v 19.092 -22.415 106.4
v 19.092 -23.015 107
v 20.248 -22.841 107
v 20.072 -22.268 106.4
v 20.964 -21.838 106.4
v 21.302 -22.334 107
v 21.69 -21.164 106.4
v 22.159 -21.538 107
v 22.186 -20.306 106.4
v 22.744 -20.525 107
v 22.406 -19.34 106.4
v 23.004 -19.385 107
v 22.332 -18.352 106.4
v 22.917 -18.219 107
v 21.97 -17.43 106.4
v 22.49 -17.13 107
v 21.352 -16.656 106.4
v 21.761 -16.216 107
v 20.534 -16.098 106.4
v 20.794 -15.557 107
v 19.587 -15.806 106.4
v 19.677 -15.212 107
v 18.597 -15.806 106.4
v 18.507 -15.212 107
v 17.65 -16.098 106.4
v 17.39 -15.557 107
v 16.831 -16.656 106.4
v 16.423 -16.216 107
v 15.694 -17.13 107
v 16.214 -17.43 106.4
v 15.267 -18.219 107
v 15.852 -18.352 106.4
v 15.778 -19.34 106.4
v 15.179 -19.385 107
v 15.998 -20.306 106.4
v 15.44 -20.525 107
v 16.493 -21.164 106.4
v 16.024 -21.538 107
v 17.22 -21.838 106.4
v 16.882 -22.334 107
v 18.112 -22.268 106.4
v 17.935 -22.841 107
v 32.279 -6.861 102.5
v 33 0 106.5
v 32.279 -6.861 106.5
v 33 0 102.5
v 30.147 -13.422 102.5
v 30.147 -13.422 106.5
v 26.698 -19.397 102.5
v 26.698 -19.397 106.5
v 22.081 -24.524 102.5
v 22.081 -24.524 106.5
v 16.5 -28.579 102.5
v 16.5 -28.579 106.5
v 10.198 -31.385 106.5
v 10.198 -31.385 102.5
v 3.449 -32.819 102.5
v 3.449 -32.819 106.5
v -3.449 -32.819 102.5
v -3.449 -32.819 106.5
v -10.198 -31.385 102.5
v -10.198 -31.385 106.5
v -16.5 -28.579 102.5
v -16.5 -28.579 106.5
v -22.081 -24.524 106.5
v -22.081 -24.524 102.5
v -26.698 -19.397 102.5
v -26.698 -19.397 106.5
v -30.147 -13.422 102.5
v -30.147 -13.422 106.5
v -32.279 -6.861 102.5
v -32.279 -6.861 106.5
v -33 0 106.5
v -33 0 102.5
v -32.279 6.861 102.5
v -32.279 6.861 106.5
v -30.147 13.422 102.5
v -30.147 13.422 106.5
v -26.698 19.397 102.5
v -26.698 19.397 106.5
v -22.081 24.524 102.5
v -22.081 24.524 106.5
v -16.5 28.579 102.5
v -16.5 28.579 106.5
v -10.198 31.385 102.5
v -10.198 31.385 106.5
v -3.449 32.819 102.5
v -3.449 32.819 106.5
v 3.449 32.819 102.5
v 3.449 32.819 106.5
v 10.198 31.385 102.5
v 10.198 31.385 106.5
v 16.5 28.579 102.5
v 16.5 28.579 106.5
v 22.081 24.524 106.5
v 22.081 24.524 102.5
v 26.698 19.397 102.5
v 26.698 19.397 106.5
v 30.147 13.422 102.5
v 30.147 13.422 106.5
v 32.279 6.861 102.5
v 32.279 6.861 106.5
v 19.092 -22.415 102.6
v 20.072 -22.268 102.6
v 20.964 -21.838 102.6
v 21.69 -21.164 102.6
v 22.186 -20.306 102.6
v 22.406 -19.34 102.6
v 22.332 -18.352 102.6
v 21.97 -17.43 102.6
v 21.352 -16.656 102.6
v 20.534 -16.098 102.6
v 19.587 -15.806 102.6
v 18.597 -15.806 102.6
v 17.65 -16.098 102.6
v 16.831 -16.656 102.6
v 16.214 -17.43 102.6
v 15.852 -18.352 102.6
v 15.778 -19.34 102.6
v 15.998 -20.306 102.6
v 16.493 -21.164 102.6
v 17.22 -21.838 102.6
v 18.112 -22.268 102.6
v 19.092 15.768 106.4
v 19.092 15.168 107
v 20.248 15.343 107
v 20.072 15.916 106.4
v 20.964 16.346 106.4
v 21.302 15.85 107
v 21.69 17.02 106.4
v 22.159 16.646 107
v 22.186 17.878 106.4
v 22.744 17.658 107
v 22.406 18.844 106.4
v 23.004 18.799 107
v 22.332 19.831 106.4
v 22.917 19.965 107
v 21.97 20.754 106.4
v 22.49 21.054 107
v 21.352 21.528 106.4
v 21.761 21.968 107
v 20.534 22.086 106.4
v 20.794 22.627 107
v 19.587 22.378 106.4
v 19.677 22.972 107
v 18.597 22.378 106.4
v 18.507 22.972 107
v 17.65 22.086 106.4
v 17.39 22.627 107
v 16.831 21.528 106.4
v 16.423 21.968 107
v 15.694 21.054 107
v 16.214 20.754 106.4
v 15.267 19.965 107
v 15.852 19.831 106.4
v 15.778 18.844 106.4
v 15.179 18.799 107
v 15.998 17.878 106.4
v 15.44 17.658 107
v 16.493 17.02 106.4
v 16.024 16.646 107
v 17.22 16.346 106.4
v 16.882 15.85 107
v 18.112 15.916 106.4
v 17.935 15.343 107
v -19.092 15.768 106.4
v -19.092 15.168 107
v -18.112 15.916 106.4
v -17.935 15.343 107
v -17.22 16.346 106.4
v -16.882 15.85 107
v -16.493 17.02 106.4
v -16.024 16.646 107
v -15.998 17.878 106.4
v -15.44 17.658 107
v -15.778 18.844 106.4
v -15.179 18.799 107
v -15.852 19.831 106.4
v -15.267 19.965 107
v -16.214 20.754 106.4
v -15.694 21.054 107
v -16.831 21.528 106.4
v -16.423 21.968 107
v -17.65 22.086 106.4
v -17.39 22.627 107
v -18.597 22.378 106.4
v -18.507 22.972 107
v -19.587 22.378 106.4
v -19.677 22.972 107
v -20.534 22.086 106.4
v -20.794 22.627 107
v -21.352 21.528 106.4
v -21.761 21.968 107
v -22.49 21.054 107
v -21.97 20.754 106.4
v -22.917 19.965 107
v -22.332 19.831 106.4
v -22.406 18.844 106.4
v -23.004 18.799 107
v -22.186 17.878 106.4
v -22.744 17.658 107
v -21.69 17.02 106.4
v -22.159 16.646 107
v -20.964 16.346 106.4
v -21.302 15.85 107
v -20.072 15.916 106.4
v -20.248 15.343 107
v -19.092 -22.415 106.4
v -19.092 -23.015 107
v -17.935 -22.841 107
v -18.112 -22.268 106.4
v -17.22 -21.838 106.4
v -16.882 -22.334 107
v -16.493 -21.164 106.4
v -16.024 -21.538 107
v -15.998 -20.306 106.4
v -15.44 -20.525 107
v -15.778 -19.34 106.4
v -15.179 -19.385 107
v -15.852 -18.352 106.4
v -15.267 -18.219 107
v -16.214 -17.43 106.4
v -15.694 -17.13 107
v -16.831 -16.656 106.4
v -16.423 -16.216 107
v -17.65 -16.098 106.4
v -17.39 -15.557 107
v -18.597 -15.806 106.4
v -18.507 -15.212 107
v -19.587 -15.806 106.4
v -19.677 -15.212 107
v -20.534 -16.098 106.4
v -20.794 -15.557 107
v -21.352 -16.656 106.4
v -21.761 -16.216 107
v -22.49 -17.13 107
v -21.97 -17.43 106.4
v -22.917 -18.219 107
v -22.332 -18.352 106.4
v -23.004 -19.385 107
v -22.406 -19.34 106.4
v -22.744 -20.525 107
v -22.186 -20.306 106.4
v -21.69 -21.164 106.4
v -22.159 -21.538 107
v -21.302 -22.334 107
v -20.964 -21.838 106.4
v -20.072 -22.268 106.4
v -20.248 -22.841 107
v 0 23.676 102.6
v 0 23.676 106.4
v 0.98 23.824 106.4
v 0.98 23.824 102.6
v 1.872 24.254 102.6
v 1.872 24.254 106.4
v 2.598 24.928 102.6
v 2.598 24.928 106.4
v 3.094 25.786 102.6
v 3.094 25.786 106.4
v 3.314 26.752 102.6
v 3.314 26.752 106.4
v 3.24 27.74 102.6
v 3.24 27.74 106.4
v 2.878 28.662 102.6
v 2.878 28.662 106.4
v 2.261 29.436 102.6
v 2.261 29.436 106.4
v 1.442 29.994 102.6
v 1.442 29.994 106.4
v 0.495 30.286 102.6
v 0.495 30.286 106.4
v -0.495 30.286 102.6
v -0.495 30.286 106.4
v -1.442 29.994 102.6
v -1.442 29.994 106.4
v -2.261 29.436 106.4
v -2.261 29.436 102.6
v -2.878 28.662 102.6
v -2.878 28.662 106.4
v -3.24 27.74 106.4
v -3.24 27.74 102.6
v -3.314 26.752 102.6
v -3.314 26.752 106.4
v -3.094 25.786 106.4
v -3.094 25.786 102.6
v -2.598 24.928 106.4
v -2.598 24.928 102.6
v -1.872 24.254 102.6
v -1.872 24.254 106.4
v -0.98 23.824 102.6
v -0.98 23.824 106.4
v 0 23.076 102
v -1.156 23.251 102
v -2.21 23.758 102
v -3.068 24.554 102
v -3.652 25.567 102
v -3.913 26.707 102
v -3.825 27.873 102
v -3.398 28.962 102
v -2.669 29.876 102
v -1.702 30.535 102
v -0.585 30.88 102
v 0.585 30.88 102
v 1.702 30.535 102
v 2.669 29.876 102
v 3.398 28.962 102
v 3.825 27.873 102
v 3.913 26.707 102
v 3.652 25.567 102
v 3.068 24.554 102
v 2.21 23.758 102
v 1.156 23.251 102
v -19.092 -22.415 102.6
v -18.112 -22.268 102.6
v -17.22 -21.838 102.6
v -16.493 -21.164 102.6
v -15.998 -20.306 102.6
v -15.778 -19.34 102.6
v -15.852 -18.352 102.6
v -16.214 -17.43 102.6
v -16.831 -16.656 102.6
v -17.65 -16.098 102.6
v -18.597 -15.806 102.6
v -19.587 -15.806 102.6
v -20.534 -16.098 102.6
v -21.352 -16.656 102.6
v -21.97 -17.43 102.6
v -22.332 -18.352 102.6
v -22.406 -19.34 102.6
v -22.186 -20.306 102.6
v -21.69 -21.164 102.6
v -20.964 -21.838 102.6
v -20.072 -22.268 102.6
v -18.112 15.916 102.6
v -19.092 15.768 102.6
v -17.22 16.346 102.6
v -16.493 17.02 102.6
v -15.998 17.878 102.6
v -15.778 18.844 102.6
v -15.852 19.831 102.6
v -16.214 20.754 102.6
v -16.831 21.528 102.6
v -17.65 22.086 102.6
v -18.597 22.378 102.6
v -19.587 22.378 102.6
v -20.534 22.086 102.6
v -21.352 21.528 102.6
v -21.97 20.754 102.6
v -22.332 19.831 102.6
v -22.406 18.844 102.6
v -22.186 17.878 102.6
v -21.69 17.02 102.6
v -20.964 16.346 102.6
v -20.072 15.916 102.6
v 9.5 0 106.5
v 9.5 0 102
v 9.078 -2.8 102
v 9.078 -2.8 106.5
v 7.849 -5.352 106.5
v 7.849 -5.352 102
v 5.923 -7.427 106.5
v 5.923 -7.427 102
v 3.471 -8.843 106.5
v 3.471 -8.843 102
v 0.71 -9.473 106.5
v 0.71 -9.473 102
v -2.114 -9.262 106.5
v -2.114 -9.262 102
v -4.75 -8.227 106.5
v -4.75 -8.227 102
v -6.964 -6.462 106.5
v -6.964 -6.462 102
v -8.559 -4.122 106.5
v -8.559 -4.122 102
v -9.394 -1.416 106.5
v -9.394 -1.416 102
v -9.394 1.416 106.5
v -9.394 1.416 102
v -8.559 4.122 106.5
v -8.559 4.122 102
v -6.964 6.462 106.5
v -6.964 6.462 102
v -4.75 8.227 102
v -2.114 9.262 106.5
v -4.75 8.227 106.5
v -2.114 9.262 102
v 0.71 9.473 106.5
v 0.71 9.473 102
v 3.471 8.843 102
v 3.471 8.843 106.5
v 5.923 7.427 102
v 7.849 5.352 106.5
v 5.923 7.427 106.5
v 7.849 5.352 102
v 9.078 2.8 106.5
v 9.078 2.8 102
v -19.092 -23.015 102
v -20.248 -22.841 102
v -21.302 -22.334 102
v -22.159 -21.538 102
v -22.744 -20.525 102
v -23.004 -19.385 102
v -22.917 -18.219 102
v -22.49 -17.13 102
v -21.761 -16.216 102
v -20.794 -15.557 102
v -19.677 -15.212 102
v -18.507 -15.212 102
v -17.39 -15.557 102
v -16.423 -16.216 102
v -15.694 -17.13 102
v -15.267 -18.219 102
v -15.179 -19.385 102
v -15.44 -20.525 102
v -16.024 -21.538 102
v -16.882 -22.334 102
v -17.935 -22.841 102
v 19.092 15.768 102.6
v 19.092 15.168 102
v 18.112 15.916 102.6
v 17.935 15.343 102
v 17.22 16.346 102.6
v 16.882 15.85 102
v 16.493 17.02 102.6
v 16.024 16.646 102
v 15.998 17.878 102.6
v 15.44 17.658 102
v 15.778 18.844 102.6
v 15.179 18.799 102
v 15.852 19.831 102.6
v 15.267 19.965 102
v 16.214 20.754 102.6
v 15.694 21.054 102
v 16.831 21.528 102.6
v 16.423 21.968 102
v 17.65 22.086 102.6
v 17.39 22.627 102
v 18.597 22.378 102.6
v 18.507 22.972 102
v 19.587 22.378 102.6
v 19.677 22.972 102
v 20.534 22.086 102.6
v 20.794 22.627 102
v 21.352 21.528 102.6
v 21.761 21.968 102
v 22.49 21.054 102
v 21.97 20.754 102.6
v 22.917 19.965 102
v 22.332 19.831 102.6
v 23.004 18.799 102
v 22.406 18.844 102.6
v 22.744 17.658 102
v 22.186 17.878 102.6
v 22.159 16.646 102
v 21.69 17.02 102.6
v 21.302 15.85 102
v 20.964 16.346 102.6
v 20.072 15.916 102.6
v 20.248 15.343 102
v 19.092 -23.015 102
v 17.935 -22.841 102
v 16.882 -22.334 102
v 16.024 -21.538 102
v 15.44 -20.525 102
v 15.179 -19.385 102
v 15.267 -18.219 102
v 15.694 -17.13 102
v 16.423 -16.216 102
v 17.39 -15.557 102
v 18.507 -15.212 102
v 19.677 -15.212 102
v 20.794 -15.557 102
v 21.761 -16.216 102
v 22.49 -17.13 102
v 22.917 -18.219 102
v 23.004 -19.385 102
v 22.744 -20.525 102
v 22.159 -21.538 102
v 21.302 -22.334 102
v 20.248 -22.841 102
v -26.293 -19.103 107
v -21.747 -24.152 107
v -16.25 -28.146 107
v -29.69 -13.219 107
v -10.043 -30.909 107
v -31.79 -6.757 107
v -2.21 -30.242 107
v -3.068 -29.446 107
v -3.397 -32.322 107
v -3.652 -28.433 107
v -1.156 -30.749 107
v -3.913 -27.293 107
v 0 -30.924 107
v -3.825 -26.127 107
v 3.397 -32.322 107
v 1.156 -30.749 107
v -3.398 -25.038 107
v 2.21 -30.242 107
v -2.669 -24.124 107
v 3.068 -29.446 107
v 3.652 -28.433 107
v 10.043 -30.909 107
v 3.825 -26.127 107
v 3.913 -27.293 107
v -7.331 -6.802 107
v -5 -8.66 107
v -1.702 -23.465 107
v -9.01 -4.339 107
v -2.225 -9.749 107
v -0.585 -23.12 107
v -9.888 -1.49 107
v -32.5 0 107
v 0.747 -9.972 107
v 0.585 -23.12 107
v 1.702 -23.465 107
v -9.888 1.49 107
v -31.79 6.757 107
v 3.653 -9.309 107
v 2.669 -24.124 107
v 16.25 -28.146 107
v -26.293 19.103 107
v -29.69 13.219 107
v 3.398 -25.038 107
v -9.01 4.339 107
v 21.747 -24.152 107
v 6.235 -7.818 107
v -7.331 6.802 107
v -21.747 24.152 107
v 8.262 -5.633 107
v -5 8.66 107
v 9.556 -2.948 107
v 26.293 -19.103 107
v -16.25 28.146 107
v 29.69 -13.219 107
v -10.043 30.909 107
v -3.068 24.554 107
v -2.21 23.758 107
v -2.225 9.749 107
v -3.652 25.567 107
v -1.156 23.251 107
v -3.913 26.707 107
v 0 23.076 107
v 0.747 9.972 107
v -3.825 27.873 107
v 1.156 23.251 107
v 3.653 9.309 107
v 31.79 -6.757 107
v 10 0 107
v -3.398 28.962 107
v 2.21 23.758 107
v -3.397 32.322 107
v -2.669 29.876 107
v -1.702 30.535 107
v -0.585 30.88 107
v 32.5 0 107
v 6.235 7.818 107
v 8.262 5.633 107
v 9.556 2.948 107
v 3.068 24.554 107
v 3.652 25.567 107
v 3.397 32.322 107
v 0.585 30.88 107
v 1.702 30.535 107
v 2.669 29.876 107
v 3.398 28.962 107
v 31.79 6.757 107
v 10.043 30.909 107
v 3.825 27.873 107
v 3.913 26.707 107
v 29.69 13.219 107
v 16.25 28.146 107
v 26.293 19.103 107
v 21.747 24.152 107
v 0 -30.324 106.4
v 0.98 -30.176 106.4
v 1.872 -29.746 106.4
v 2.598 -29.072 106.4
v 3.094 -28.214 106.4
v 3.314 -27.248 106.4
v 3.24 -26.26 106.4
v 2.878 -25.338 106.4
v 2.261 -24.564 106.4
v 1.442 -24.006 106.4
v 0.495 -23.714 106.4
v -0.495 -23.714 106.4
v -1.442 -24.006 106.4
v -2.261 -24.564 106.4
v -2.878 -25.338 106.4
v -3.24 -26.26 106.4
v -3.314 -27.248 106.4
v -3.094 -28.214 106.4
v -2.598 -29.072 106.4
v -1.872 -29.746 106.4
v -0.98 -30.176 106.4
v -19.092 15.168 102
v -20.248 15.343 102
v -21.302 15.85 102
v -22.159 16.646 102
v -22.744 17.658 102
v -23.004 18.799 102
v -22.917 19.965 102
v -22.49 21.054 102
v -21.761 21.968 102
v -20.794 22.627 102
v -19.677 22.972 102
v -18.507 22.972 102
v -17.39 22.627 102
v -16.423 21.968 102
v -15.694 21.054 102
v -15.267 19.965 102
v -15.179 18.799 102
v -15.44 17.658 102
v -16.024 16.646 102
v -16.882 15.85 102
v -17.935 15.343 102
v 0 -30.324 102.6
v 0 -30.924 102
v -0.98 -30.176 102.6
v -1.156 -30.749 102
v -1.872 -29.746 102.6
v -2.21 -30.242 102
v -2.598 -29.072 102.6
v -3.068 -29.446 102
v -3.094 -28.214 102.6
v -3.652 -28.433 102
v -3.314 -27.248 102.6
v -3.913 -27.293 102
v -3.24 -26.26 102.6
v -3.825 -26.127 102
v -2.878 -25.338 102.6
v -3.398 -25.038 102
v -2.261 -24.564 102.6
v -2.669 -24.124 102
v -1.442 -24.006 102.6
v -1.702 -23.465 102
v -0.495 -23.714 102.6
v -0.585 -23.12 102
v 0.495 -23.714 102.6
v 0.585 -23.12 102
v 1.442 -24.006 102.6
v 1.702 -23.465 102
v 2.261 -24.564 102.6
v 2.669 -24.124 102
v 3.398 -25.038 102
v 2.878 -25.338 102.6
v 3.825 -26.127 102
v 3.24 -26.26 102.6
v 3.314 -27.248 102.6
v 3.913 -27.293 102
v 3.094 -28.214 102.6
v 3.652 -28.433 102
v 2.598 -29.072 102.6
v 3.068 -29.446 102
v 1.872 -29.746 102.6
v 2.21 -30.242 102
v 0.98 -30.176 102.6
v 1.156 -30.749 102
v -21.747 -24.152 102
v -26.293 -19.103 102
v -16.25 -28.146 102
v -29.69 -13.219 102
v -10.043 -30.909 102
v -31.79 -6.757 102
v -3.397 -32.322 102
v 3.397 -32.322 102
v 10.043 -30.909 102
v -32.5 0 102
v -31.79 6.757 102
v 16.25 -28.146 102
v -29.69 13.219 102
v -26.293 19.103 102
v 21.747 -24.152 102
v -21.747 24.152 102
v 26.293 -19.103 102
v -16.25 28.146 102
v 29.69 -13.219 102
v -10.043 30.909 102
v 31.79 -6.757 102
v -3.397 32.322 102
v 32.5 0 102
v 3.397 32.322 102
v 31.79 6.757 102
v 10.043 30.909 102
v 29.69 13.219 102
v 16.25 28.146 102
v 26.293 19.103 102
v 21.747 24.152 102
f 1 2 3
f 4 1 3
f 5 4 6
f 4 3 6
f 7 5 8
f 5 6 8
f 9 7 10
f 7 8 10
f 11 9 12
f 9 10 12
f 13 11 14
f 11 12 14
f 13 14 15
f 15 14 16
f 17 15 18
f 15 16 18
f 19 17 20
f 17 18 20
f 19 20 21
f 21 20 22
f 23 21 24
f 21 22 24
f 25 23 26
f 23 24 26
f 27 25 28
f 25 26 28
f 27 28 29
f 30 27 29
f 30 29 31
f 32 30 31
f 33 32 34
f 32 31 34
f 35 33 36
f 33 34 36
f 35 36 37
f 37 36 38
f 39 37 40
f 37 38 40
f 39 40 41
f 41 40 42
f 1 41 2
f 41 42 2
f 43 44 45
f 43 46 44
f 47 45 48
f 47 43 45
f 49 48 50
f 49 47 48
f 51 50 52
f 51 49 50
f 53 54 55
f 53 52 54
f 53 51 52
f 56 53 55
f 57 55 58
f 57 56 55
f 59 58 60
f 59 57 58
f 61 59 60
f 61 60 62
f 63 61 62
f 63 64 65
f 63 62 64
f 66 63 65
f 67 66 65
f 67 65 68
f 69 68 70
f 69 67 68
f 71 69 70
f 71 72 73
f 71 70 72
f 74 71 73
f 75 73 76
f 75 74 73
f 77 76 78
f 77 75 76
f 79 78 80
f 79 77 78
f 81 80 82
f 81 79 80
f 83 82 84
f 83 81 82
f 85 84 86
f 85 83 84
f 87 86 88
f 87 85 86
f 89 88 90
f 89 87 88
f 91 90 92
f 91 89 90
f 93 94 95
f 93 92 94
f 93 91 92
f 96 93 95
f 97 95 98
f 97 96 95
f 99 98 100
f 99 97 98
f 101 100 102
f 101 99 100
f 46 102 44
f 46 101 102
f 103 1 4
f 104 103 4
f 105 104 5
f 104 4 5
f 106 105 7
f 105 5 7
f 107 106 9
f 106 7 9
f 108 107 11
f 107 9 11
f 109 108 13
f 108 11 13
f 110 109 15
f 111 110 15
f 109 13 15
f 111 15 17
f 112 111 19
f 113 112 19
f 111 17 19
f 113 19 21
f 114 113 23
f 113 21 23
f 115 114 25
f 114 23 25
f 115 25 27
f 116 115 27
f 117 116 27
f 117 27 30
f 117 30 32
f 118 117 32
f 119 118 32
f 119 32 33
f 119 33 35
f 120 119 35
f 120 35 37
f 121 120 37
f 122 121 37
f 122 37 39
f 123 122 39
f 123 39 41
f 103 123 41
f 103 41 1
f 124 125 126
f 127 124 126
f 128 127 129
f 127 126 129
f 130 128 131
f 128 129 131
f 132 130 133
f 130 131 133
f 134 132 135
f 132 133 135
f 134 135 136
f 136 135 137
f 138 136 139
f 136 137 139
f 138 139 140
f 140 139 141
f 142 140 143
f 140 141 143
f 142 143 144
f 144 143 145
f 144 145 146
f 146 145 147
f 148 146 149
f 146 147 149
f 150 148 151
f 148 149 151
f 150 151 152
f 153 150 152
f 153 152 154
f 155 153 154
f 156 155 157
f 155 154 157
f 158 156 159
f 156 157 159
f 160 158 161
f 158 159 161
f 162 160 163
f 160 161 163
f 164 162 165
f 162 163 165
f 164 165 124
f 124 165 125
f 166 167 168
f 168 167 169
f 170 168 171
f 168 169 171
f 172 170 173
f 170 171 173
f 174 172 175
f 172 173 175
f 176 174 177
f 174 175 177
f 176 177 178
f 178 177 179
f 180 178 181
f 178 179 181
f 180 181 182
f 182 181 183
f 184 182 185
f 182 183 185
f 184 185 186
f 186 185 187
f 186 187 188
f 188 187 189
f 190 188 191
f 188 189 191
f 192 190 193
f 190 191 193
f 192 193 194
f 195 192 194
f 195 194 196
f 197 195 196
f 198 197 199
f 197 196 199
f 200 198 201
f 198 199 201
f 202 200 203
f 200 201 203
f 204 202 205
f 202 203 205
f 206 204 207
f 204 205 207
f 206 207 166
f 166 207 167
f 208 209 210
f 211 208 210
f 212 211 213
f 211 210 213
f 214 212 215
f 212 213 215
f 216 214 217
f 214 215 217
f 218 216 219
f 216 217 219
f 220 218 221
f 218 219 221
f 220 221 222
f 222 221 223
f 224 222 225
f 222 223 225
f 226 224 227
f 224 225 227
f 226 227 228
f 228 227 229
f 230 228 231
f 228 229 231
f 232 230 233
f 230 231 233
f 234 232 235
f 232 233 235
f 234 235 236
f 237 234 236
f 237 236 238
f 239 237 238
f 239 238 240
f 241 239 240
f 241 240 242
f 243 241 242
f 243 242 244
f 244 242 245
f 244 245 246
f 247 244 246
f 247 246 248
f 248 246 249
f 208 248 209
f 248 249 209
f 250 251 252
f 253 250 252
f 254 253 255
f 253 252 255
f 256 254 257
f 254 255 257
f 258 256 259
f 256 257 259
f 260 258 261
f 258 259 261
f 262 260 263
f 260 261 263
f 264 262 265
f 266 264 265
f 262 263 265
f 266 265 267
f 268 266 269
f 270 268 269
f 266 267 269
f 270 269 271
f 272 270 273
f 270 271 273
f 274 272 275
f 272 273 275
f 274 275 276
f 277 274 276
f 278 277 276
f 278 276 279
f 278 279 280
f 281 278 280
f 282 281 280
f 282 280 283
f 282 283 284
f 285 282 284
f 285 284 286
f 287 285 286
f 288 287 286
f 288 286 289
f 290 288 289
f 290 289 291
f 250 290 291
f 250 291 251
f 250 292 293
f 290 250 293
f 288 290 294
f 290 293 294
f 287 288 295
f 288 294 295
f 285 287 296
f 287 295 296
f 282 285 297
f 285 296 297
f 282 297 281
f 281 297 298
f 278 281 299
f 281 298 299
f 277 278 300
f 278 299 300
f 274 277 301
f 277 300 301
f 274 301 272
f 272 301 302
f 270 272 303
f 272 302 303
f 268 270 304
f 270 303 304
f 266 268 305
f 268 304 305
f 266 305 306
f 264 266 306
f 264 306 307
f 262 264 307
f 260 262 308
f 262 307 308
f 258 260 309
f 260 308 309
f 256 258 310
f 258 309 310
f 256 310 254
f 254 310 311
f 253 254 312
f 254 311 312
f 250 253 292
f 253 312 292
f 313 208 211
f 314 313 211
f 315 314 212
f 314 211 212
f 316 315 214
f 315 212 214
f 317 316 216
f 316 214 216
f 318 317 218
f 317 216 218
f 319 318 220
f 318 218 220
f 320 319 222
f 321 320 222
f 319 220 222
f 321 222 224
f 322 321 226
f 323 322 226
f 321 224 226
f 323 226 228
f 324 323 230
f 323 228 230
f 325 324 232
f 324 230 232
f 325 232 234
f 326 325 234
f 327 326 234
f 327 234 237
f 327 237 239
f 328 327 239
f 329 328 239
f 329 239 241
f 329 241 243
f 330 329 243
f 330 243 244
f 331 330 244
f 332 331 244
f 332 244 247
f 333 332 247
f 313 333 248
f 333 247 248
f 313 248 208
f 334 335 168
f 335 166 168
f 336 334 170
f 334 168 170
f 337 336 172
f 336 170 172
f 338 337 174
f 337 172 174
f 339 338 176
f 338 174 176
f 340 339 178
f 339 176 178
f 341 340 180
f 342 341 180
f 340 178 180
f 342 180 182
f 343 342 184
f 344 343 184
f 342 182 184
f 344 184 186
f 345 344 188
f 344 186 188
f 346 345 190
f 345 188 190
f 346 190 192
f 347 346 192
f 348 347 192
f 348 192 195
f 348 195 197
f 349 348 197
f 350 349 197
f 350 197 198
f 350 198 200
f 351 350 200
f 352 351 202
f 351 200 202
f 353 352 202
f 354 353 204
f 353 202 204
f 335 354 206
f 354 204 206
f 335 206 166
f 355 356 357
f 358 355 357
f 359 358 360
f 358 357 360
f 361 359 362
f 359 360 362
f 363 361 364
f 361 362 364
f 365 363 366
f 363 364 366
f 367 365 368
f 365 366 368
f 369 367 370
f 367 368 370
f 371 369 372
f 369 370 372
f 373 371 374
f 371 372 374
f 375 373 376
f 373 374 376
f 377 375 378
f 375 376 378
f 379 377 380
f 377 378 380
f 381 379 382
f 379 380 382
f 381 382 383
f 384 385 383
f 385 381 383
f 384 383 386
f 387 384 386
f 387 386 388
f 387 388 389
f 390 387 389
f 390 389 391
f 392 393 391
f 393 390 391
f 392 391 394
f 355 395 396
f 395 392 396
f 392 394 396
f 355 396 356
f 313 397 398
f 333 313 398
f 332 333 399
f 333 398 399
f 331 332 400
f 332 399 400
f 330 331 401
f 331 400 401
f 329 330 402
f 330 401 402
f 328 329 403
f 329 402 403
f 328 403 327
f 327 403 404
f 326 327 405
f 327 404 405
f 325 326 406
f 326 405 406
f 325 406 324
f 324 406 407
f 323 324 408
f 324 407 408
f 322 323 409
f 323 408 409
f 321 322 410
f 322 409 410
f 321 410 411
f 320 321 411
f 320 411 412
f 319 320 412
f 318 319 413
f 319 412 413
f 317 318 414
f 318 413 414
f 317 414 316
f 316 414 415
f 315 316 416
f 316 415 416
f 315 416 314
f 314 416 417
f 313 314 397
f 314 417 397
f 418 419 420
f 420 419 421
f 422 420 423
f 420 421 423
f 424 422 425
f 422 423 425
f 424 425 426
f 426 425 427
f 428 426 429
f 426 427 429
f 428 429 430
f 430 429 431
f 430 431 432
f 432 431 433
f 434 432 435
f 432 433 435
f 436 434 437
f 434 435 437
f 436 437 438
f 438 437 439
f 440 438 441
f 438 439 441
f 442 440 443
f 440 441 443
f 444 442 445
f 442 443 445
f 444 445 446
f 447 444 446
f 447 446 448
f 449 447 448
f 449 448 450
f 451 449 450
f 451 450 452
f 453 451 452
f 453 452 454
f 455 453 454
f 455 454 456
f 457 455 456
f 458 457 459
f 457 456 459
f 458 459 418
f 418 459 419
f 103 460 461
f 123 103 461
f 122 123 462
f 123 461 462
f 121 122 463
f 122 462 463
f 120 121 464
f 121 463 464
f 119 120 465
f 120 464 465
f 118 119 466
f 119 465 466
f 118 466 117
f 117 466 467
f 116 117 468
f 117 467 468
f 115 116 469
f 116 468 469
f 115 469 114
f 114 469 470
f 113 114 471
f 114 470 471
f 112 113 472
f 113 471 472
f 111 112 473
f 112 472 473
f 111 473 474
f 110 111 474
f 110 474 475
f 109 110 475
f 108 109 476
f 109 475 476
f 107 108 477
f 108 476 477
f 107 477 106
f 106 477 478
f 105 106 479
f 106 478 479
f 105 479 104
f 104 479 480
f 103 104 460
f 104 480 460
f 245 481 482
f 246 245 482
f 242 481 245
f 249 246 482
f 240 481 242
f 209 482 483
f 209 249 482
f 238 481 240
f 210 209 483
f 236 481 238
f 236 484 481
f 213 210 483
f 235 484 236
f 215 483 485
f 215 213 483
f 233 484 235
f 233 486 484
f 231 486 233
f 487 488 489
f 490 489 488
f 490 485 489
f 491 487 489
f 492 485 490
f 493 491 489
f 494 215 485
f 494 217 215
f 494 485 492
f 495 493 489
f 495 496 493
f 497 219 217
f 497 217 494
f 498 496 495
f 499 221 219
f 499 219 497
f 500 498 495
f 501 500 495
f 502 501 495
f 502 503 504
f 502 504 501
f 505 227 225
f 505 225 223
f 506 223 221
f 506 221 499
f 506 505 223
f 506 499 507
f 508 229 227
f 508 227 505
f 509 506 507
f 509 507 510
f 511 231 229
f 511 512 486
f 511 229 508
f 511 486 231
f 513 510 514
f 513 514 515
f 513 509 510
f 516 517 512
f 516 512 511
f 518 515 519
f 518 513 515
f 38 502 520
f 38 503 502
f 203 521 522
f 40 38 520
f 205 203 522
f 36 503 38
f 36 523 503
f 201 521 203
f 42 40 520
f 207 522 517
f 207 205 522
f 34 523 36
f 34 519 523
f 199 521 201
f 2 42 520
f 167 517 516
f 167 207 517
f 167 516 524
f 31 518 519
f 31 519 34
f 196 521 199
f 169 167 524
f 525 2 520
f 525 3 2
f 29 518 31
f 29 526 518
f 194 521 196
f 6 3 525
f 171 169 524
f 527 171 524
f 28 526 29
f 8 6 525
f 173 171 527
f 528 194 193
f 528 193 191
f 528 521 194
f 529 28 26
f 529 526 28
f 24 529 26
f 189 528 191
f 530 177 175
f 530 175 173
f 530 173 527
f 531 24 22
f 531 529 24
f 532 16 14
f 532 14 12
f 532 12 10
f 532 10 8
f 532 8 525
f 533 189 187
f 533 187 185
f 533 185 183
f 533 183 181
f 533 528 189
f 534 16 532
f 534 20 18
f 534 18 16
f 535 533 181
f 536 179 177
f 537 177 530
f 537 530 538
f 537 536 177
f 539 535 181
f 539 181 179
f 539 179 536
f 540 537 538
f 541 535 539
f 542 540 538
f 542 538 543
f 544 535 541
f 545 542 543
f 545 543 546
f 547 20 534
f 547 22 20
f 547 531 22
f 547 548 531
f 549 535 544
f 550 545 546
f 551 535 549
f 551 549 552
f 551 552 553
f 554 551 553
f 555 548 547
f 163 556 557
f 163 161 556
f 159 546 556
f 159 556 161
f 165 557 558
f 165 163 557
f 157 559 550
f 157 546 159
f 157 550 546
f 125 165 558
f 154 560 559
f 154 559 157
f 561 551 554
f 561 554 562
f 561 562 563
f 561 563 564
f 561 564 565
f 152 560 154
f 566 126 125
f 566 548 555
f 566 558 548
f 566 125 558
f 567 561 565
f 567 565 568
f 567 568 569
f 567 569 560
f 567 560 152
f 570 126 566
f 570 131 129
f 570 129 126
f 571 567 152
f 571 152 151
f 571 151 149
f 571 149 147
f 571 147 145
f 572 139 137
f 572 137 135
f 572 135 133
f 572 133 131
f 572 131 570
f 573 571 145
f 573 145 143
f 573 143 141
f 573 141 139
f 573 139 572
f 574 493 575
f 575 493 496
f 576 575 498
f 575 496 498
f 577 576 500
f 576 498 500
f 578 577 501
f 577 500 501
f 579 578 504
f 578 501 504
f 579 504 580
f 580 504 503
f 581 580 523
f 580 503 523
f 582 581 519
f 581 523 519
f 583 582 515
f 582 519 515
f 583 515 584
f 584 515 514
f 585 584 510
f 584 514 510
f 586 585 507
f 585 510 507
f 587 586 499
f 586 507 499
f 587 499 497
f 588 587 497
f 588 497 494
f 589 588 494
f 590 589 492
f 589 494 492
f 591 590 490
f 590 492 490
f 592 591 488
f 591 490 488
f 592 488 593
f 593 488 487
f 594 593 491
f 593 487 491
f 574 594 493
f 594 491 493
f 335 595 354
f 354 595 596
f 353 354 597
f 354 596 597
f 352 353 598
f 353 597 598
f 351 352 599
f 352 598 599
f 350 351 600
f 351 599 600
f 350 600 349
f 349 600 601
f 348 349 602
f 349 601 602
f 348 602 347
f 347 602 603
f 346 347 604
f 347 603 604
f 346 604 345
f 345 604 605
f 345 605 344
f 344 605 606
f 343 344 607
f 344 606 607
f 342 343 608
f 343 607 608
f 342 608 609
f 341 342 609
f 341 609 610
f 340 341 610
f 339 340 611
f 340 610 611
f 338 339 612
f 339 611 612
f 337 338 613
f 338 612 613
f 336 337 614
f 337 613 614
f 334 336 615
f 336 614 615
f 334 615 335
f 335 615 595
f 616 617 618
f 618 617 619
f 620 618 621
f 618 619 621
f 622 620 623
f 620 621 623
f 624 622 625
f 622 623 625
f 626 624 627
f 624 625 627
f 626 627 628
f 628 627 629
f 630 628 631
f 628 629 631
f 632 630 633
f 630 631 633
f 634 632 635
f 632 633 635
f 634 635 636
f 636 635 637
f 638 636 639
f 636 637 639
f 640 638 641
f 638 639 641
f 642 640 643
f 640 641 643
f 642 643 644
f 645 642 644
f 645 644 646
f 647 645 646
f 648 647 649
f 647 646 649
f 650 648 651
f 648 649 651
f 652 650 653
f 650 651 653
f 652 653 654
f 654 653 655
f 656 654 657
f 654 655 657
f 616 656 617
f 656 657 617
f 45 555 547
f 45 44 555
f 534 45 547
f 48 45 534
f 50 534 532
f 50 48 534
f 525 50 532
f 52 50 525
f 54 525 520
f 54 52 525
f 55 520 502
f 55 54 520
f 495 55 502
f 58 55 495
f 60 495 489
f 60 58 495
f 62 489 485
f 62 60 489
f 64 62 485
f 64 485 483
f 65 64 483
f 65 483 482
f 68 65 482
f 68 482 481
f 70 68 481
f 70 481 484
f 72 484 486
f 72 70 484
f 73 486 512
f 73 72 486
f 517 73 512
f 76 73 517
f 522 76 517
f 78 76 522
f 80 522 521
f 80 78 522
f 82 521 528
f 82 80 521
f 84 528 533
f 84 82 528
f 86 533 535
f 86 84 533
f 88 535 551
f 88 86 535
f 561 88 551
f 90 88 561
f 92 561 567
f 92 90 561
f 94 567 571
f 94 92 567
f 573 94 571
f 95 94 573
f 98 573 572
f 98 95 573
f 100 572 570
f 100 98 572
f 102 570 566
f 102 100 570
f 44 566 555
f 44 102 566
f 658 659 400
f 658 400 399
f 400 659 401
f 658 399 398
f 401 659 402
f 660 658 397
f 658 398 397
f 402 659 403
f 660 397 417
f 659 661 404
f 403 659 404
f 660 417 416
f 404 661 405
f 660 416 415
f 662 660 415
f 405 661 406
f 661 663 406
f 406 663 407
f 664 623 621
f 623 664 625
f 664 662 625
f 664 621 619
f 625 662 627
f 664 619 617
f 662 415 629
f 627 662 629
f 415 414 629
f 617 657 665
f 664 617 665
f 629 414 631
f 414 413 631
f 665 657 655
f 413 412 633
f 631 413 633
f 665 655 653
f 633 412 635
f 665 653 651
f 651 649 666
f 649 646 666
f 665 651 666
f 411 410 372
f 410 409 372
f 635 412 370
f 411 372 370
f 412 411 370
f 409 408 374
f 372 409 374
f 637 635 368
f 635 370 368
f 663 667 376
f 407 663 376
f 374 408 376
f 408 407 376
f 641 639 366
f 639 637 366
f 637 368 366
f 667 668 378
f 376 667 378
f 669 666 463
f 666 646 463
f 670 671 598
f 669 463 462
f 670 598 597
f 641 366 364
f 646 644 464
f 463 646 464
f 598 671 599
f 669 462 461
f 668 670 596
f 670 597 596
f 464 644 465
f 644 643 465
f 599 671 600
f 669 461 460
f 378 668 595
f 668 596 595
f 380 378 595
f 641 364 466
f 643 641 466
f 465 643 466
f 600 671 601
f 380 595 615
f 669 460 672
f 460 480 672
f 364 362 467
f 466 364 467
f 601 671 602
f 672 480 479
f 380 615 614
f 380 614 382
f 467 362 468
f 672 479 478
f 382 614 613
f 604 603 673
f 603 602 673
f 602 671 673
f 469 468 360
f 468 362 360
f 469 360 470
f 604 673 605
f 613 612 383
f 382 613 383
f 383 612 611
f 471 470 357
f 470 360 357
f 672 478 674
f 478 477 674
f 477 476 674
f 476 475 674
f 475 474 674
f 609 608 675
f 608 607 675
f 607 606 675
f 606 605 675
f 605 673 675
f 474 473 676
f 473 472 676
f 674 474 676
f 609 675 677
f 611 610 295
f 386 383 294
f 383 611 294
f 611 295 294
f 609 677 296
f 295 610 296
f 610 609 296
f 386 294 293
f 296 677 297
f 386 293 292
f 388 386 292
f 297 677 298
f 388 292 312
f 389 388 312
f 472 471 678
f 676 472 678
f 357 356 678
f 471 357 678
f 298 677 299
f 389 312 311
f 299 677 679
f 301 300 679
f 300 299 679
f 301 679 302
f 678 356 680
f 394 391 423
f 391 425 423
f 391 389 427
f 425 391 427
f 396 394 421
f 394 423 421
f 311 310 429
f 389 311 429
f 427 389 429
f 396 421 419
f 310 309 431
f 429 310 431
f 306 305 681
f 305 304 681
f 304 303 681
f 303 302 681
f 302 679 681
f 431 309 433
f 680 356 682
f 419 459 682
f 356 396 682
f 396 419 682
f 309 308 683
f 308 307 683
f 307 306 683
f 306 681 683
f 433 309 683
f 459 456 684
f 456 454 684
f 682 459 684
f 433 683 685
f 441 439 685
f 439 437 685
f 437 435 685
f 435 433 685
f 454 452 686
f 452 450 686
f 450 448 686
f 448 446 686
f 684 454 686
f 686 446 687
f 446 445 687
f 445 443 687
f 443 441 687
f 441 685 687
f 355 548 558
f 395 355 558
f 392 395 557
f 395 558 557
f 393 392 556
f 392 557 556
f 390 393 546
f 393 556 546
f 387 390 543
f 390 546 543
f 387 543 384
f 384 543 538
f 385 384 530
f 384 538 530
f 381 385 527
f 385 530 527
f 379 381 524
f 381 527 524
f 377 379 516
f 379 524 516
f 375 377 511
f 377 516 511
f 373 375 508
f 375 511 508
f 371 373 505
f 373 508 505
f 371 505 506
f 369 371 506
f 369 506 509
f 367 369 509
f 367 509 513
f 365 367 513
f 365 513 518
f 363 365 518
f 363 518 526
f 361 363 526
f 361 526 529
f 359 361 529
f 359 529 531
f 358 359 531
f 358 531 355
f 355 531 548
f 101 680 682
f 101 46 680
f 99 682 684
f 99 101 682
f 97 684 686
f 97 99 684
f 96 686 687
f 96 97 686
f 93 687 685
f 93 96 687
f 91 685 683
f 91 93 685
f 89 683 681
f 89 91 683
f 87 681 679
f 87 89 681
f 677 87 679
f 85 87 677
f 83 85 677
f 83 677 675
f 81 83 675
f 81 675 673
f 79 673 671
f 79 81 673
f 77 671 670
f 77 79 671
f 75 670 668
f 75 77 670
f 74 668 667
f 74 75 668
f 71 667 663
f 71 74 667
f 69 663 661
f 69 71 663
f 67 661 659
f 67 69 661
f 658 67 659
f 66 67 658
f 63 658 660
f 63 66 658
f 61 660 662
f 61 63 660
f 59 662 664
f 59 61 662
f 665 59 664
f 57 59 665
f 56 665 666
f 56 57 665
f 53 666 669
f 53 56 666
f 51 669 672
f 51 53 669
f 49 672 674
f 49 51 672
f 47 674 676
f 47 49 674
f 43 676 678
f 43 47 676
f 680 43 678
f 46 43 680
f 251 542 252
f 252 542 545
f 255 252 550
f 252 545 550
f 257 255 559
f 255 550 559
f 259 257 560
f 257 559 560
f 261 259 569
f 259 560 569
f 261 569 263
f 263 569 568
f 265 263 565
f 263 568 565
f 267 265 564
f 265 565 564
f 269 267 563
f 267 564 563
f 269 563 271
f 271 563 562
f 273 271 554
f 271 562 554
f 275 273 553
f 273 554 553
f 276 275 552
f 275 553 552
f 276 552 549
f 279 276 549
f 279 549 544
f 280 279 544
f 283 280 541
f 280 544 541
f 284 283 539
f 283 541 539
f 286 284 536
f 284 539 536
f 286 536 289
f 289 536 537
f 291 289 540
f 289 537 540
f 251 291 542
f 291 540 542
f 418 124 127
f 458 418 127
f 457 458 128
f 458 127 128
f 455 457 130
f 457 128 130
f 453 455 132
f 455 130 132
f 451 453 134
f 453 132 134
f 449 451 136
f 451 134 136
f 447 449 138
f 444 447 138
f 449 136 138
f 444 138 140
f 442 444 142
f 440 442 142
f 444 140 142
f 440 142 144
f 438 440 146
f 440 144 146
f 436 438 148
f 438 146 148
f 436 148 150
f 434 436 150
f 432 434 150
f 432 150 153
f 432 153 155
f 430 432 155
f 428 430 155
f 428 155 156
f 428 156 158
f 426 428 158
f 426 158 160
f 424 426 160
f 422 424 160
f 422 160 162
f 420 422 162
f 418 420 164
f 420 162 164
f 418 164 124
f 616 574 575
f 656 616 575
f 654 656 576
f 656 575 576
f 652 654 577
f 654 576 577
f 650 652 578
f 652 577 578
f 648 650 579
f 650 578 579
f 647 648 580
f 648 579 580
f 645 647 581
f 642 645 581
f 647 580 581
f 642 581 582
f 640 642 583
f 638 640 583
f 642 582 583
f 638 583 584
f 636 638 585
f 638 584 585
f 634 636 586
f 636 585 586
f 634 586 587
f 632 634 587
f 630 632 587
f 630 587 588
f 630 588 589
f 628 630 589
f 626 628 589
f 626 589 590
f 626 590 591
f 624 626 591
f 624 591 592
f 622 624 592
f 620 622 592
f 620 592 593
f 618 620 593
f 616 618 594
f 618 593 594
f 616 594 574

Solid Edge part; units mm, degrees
sketch "Sketch1" plane through (0, 0, 102) normal (0, 0, 1) x (1, 0, 0)
  circle A0 centre (0, 0) radius 33
  circle A1 centre (0, 0) radius 9.5
extrude "Protrusion1" add sketch "Sketch1" along normal blind 5
chamfer "Faza_1" distance 0.5 angle 45 3 edges at (-9.5, 0, 107) (-33, 0, 107) (-33, 0, 102)
hole "Otwór_1" at (-19.0919, 19.0919, 107) direction (0, 0, -1) diameter 6.647 end up to next start chamfer 0.6 start chamfer angle 45 end chamfer 0.6 end chamfer angle 45
hole "Hole1" at (0, 27, 107) direction (0, 0, -1) diameter 6.647 end up to next start chamfer 0.6 start chamfer angle 45 end chamfer 0.6 end chamfer angle 45
hole "Hole2" at (19.0919, 19.0919, 107) direction (0, 0, -1) diameter 6.647 end up to next start chamfer 0.6 start chamfer angle 45 end chamfer 0.6 end chamfer angle 45
hole "Hole3" at (19.0919, -19.0919, 107) direction (0, 0, -1) diameter 6.647 end up to next start chamfer 0.6 start chamfer angle 45 end chamfer 0.6 end chamfer angle 45
hole "Hole4" at (0, -27, 107) direction (0, 0, -1) diameter 6.647 end up to next start chamfer 0.6 start chamfer angle 45 end chamfer 0.6 end chamfer angle 45
hole "Hole5" at (-19.0919, -19.0919, 107) direction (0, 0, -1) diameter 6.647 end up to next start chamfer 0.6 start chamfer angle 45 end chamfer 0.6 end chamfer angle 45
